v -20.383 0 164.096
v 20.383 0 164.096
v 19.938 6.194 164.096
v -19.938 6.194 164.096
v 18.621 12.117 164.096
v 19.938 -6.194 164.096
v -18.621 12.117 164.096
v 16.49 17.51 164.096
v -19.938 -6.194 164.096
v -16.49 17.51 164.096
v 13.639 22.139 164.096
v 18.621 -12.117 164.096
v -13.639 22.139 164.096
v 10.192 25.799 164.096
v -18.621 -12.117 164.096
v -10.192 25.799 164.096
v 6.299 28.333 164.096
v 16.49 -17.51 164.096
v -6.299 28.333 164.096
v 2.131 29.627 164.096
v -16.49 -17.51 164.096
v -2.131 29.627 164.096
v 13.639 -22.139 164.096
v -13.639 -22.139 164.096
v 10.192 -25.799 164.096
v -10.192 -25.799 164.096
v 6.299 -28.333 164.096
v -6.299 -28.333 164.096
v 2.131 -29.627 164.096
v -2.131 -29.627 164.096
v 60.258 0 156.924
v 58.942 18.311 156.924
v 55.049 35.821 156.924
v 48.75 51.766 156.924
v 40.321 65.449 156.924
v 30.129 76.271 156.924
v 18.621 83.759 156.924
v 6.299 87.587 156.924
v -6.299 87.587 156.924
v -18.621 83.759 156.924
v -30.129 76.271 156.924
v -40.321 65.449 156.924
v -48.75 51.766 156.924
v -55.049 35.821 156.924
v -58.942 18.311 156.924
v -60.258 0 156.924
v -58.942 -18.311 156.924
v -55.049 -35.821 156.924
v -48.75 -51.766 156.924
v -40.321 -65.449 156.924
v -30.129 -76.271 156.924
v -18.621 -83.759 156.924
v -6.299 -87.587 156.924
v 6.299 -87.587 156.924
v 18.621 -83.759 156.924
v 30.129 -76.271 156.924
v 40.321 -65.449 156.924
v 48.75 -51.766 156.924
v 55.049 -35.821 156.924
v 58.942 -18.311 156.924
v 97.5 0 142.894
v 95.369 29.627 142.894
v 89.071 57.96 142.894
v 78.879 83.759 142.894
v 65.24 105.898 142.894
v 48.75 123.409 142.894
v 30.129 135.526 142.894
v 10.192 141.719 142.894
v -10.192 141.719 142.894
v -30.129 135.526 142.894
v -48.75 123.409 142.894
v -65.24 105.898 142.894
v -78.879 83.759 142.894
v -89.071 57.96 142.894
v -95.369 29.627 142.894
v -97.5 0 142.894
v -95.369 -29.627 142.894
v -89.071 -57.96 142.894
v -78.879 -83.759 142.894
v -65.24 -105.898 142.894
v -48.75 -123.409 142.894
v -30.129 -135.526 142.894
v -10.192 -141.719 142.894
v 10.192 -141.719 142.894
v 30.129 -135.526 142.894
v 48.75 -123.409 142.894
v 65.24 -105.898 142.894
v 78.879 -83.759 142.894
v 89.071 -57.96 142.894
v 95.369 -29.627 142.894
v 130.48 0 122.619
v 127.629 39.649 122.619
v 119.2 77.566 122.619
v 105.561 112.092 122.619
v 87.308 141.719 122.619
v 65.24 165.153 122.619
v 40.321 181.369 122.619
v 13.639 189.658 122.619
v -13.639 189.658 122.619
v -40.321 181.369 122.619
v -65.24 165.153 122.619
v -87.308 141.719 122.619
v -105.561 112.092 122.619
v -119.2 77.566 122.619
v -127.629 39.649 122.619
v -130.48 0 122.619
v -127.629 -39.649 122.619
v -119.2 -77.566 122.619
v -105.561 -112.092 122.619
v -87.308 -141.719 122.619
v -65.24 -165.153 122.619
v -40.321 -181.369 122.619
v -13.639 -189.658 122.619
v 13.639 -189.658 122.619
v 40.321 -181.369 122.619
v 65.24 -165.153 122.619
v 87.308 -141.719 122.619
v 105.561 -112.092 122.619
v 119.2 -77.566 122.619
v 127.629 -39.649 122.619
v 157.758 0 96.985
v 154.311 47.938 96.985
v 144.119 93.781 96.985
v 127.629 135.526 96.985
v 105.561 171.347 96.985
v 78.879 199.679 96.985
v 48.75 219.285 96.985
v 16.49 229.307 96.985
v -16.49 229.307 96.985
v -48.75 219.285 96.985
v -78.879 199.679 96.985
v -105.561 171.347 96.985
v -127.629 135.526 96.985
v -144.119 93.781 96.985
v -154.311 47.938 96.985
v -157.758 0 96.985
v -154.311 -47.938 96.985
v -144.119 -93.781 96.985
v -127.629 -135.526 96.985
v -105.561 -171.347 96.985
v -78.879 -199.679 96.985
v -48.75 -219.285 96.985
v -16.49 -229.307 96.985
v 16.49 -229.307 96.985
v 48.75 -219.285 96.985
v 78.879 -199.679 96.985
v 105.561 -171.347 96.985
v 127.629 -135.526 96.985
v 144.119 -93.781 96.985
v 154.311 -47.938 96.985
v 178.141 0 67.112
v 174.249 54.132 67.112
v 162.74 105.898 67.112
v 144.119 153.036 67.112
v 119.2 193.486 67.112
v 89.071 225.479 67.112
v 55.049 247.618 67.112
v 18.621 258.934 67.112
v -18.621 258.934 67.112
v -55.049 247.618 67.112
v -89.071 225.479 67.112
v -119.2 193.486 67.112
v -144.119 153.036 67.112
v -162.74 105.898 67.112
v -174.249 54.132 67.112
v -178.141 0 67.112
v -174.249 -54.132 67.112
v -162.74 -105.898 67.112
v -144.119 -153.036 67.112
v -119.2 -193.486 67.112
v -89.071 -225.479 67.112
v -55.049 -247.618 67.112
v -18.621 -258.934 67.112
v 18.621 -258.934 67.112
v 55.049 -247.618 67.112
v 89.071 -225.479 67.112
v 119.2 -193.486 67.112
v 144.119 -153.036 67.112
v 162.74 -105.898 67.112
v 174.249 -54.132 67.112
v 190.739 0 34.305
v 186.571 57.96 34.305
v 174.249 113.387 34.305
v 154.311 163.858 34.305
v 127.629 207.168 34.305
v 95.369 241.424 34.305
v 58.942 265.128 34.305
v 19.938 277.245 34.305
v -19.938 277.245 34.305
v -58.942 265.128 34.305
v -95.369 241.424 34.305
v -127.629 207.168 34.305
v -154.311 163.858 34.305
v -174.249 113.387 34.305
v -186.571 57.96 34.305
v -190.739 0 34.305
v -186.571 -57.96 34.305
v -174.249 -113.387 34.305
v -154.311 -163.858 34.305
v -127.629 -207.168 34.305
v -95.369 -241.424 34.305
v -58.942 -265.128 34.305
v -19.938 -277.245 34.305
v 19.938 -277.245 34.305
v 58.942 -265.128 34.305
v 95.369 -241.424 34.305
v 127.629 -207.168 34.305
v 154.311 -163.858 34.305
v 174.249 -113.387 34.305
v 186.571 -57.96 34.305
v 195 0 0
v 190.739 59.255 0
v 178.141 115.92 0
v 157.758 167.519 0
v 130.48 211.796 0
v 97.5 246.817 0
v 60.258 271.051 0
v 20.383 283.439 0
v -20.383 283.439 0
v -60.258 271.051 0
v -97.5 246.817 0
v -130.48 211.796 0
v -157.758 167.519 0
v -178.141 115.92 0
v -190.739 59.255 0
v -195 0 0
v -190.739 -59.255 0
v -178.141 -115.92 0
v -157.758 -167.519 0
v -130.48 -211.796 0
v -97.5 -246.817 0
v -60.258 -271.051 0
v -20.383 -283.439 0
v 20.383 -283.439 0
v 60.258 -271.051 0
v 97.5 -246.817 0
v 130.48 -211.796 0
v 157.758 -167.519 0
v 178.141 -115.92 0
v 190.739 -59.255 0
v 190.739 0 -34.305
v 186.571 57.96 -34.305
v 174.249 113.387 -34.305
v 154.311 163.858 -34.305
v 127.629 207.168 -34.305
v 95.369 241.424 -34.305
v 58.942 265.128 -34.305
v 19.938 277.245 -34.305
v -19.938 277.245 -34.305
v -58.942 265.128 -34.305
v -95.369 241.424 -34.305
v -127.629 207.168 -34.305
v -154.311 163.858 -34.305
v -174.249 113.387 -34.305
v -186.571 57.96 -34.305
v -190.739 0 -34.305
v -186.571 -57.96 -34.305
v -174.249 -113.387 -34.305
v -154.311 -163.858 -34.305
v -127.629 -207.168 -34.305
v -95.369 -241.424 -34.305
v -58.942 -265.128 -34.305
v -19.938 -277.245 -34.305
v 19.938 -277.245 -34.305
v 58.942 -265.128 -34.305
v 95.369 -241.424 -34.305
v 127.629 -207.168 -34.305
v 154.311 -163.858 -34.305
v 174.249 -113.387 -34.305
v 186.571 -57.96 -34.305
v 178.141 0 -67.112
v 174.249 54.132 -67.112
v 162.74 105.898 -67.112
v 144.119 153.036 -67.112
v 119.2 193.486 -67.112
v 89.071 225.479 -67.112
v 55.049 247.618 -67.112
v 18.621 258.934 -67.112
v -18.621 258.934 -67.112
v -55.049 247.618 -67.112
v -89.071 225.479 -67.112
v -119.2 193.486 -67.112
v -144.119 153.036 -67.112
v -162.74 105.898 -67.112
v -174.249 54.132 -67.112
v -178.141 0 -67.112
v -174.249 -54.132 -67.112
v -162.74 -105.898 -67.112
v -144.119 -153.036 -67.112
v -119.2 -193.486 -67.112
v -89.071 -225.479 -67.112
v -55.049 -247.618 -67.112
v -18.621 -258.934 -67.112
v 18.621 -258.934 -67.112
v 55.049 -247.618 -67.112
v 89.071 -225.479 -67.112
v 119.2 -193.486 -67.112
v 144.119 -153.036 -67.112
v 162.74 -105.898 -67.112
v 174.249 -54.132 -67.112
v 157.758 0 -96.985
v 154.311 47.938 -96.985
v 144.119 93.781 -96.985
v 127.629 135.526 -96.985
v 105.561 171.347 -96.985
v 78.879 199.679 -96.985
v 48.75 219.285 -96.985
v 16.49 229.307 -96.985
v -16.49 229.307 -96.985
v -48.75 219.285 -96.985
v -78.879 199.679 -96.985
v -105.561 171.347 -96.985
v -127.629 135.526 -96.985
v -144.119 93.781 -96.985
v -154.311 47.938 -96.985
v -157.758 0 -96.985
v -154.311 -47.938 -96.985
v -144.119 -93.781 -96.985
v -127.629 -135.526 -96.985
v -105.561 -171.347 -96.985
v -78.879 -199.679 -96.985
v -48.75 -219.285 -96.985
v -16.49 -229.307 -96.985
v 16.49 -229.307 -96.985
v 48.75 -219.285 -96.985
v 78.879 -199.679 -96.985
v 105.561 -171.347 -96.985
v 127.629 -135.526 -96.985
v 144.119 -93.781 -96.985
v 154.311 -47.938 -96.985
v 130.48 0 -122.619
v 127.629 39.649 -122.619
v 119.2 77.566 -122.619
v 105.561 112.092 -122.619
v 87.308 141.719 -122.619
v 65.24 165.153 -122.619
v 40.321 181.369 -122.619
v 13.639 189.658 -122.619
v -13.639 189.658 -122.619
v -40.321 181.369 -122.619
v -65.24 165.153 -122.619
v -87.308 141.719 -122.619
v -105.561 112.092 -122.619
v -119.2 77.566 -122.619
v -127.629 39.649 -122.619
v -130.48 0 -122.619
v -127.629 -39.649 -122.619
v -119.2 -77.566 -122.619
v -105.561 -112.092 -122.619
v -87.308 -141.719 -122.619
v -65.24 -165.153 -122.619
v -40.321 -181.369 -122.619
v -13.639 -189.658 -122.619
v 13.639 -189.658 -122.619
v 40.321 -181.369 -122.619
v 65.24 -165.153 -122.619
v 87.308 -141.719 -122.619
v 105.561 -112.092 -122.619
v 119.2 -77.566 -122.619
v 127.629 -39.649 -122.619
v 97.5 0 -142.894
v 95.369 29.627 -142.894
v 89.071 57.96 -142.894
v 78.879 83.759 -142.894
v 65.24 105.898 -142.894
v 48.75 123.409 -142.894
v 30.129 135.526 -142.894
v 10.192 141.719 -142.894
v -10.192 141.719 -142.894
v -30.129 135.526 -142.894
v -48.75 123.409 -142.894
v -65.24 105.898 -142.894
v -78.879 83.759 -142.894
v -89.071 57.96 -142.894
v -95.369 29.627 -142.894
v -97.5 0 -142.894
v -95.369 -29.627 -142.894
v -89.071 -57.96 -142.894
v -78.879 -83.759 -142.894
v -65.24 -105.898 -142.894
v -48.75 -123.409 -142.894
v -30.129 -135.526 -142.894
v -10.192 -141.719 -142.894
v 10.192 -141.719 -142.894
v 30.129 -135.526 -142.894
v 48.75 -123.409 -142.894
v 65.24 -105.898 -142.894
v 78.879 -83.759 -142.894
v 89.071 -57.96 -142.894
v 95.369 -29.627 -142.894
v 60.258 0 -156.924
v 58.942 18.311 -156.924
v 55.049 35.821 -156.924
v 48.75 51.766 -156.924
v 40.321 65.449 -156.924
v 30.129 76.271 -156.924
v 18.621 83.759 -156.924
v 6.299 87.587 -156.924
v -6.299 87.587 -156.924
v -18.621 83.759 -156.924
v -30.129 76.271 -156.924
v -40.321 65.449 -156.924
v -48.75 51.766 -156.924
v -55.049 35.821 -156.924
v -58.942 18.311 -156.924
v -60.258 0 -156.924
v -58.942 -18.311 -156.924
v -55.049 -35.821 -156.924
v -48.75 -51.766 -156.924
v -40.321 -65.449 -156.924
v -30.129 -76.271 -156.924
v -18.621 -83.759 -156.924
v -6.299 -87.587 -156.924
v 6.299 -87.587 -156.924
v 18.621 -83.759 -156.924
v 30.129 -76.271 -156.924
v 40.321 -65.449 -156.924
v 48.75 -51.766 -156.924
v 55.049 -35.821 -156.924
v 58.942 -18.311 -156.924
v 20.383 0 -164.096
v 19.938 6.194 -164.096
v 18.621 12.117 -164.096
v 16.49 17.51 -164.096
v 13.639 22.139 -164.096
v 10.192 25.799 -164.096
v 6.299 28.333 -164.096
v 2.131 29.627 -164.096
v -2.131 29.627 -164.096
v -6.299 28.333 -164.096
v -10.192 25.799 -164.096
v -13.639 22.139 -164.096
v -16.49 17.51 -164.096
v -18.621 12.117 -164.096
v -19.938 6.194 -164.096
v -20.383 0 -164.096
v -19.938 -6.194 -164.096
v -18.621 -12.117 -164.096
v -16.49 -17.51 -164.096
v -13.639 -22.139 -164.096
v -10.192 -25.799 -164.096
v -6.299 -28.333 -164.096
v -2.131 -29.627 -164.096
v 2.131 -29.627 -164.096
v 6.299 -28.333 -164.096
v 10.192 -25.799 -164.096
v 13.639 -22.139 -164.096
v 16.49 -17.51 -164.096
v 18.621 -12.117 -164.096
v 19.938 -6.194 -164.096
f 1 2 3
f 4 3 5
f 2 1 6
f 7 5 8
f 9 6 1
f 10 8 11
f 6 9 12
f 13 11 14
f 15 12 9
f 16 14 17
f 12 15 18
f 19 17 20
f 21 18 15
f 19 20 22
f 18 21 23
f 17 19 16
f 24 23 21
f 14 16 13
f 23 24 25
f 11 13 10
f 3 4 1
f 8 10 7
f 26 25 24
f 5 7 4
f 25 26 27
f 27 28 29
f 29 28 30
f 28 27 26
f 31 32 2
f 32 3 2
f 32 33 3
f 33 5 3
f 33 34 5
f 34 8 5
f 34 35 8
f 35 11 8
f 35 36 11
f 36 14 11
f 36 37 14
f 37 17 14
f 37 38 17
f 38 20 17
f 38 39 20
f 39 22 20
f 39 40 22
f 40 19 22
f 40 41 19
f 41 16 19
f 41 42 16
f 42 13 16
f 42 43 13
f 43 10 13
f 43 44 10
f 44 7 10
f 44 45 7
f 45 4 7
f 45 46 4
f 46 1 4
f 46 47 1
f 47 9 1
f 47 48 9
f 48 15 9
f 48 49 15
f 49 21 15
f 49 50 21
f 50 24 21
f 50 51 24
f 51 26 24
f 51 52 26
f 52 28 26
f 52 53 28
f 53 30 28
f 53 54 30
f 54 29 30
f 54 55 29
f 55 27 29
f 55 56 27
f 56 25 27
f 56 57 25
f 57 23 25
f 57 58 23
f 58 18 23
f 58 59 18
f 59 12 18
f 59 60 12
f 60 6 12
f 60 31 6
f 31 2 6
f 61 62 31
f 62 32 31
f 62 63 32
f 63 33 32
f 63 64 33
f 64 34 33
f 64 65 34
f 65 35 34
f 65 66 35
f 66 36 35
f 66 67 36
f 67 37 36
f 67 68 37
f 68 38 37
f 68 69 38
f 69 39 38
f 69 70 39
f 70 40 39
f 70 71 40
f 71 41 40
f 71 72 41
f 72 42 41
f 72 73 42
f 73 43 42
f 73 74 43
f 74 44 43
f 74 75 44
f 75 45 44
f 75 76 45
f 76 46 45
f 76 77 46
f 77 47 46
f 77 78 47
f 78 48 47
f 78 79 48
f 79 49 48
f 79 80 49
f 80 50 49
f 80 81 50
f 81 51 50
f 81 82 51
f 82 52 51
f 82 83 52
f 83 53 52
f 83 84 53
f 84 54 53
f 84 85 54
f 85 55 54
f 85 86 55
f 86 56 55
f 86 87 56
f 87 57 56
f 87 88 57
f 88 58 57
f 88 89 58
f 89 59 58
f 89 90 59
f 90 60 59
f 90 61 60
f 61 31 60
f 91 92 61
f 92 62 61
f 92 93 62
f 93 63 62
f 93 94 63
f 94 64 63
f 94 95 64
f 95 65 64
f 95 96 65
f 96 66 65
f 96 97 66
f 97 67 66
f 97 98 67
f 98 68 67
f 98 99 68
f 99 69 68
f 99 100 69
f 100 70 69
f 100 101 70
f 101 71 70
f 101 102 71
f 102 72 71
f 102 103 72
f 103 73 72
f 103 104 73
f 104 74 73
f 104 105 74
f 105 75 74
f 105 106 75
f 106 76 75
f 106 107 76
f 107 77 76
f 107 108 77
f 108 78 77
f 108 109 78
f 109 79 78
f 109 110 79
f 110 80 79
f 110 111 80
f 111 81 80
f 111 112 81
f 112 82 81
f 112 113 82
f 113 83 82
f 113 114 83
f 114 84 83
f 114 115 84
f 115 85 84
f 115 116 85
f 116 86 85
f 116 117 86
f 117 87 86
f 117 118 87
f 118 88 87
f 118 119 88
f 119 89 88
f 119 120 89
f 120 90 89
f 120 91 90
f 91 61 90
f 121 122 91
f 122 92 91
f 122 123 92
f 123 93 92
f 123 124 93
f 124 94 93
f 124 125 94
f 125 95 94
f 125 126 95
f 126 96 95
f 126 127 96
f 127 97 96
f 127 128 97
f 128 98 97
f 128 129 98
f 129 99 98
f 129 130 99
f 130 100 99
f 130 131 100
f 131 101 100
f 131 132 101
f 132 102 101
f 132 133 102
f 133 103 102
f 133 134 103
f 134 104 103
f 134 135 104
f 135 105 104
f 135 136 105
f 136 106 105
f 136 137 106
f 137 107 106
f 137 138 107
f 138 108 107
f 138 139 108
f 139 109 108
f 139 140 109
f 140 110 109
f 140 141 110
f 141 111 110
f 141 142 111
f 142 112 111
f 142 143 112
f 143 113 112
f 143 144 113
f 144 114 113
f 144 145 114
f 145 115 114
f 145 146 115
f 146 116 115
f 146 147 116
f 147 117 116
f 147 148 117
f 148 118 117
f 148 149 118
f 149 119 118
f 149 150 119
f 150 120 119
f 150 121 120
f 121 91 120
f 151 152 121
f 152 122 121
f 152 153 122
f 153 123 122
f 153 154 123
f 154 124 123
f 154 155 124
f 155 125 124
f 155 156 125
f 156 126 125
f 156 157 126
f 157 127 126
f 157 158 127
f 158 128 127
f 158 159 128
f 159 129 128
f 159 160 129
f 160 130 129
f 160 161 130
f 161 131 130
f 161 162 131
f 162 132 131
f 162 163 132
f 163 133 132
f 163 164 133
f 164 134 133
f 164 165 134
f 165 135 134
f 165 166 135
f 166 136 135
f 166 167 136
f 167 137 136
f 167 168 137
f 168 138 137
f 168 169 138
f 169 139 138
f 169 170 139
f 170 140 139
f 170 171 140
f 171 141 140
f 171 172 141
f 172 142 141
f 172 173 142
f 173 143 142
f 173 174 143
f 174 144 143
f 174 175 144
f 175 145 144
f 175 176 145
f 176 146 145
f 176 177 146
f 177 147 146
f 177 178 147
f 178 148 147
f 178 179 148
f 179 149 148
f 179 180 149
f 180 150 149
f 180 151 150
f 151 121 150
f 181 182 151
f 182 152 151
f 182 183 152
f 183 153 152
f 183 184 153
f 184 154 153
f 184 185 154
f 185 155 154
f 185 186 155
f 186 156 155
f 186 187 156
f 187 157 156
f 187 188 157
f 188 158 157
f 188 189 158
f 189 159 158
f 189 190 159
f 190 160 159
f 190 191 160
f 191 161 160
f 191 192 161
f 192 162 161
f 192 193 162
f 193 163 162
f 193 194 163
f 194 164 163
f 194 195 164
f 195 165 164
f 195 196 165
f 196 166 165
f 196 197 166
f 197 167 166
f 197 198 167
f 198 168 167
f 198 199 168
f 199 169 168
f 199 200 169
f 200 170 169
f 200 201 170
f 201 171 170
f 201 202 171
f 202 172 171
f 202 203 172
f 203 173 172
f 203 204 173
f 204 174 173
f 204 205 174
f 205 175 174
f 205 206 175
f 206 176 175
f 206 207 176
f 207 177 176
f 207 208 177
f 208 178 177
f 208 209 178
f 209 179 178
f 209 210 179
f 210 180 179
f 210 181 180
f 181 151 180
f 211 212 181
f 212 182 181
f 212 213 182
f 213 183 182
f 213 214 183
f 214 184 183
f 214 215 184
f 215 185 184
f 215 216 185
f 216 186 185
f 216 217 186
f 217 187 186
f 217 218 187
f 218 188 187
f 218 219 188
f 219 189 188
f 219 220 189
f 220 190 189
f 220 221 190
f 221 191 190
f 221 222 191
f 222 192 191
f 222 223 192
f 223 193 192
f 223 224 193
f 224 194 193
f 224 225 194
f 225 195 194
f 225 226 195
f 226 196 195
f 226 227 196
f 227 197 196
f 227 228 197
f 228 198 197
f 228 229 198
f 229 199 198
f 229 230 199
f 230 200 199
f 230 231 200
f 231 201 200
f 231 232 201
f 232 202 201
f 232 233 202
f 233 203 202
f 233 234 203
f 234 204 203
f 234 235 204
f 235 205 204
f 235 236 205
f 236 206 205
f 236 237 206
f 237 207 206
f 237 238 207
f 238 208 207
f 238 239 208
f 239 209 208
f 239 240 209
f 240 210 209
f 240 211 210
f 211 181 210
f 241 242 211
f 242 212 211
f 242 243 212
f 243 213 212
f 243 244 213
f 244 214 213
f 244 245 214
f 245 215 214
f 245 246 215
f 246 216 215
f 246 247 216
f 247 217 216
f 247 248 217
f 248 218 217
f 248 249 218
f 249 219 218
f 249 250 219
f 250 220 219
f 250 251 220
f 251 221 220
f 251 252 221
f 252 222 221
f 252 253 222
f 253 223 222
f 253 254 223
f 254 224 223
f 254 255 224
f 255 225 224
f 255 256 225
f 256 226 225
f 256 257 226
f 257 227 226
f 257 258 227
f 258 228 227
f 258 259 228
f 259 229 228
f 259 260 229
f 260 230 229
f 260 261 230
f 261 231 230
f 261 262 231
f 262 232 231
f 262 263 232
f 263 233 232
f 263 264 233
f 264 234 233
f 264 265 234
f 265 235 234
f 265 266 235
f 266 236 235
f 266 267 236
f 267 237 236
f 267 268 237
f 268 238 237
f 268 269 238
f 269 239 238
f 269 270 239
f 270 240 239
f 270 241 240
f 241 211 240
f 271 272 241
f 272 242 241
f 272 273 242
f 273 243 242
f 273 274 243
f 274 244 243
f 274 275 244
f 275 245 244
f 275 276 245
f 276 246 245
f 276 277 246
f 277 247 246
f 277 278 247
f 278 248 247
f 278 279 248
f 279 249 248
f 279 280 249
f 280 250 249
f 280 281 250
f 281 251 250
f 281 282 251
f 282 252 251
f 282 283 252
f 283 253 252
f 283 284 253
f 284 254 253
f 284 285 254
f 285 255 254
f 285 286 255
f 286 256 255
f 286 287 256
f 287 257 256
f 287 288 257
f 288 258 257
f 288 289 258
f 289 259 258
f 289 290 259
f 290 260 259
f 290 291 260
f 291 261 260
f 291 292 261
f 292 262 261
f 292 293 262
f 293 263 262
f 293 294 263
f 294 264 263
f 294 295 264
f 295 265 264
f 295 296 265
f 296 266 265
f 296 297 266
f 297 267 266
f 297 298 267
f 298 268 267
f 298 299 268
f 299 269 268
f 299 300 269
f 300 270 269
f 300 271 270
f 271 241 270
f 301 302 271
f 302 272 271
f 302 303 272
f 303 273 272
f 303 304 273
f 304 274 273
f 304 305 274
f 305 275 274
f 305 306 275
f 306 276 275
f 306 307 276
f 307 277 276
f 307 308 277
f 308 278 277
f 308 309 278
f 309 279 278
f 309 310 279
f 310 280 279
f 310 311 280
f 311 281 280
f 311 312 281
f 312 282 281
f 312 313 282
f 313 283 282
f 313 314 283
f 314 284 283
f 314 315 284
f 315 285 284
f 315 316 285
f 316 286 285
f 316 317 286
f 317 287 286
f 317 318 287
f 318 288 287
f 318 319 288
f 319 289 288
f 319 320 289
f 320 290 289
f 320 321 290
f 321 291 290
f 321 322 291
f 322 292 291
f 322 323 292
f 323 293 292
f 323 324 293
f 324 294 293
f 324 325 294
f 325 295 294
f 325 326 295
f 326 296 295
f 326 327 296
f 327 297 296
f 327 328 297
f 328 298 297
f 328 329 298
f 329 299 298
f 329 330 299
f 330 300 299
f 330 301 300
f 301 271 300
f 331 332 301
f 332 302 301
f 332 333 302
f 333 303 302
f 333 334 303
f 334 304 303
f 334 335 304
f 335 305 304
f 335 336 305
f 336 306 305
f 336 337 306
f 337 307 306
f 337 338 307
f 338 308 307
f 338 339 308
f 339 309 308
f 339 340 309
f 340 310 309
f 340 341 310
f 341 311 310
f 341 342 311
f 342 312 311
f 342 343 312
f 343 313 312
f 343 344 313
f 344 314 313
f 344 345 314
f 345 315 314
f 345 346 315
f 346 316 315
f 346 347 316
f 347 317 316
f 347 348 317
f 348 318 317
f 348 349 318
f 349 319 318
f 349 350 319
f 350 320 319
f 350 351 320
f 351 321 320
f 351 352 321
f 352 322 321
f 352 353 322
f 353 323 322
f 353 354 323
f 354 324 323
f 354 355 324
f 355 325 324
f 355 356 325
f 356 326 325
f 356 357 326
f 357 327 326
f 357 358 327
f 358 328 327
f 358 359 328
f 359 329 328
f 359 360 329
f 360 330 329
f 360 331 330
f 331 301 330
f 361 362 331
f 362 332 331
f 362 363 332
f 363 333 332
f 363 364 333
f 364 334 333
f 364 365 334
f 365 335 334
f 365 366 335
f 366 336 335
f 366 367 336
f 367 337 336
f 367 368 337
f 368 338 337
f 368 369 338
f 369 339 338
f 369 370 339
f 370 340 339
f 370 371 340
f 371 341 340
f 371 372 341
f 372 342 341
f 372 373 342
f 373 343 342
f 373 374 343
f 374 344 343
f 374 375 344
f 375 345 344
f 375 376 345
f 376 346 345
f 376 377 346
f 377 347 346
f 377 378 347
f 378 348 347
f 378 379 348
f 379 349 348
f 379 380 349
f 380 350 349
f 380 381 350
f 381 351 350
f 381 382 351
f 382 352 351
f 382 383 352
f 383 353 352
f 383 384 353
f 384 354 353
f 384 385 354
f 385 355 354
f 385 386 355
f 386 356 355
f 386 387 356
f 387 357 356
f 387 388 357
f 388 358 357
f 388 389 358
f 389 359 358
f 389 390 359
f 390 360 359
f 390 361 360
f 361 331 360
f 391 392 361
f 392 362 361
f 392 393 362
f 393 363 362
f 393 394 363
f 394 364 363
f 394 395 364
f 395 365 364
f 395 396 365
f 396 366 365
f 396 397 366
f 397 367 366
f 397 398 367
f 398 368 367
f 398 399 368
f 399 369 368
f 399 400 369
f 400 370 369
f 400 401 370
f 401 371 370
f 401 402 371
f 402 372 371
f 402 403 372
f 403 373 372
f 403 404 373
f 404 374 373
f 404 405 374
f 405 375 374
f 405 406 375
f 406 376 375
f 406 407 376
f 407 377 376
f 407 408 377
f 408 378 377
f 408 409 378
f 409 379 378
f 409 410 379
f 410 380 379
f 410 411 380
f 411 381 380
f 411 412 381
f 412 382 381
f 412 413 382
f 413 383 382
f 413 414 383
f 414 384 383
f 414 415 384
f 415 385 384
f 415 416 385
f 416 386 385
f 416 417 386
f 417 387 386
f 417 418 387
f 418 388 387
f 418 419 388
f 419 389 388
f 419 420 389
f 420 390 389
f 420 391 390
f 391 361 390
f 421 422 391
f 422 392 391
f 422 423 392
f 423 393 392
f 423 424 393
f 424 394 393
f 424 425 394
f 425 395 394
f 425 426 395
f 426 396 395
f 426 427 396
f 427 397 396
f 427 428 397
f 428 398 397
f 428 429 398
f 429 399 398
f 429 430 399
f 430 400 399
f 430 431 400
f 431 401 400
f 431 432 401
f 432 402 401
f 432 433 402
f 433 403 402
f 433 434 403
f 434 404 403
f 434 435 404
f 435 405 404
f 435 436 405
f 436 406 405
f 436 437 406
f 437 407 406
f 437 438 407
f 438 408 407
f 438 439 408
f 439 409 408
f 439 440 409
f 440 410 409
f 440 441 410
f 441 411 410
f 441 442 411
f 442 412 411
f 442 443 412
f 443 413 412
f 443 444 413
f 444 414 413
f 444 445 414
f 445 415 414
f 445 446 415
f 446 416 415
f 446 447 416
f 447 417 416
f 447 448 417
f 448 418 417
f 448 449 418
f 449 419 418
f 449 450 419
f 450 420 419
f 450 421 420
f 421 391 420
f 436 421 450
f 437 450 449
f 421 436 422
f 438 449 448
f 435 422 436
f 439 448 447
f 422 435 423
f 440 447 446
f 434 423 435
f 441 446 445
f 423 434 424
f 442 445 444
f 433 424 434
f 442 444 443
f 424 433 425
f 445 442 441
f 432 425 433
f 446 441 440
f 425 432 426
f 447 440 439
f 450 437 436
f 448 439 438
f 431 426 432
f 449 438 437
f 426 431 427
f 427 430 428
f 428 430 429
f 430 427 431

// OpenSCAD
// Generated by SolidPython 1.0.1 on 2020-07-29 00:46:51


scale(v = [13, 19, 11]) {
	sphere(r = 15);
}
/***********************************************
*********      SolidPython code:      **********
************************************************
 
# import packages: SolidPython
from solid import *
from solid.utils import *
from itertools import chain, combinations, permutations


class Resize:

    def __init__(self, scad_file):
        self.scad_file = scad_file
        #self.scad_file = import_scad(scad_file)
        # cone/cylinder param:
        self.r1 = 0
        self.r2 = 0
        self.h = 0
        # rectangular prism param:
        self.w = 0
        self.l = 0
        # ellipse param:
        self.r = 0

    # import OpenScad code (file name corresponds to shape)


    # classify shape + parameters
    def assign(self, param1, param2, param3):
        if self.scad_file == 'cone.scad':
            self.r1 = param1
            self.r2 = param2
            self.h = param3
        elif self.scad_file == 'cylinder.scad':
            self.r1 = param1
            self.r2 = param2
            self.h = param3
        elif self.scad_file == 'rectangularPrism.scad':
            self.h = param1
            self.l = param2
            self.w = param3
        else:
            self.r = param1
            self.h = param2

    # resize parameters
    def iterate(self):
        x = range(3, 20, 2)
        i = 1
        if self.scad_file == 'cone.scad':
            tempList = list(permutations(x, 2))
            for temp in tempList:
                param1 = temp[0]
                param2 = temp[1]
                filepath = 'produced_scad_files/' + 'cone' + str(param1) + '_' + str(param2) + '_' + '.scad'
                scad_render_to_file(cylinder(h=param1, r1=param2, r2=0), filepath)

        elif self.scad_file == 'cylinder.scad':
            tempList = list(permutations(x, 3))
            for temp in tempList:
                param1 = temp[0]
                param2 = temp[1]
                filepath = 'produced_scad_files/' + 'cylinder' + str(param1) + '_' + str(param2) + '_' + '.scad'
                scad_render_to_file(cylinder(h=param1, r1=param2, r2=param2), filepath)

        elif self.scad_file == 'rectangularPrism.scad':
            tempList = list(permutations(x, 3))
            for temp in tempList:
                param1 = temp[0]
                param2 = temp[1]
                param3 = temp[2]
                filepath = 'produced_scad_files/' + 'rectangularPrism' + str(param1) + '_' + str(param2) + '_' + str(
                    param3) + '.scad'
                scad_render_to_file(cube(size=(param1, param2, param3)), filepath)

        elif self.scad_file == 'ellipse.scad':
            tempList = list(permutations(x, 4))
            for temp in tempList:
                param1 = temp[0]
                param2 = temp[1]
                param3 = temp[2]
                param4 = temp[3]
                filepath = 'produced_scad_files/' + 'ellipse' + str(param1) + '_' + str(param2) + '_' + str(param3) + '_' + str(param4) + '.scad'
                scad_render_to_file(scale([param1, param2, param3])(sphere(r=param4)), filepath)

    def render_to_scadfile(self):
        scad_render_to_file(scad, 'example.scad') 
 
************************************************/
